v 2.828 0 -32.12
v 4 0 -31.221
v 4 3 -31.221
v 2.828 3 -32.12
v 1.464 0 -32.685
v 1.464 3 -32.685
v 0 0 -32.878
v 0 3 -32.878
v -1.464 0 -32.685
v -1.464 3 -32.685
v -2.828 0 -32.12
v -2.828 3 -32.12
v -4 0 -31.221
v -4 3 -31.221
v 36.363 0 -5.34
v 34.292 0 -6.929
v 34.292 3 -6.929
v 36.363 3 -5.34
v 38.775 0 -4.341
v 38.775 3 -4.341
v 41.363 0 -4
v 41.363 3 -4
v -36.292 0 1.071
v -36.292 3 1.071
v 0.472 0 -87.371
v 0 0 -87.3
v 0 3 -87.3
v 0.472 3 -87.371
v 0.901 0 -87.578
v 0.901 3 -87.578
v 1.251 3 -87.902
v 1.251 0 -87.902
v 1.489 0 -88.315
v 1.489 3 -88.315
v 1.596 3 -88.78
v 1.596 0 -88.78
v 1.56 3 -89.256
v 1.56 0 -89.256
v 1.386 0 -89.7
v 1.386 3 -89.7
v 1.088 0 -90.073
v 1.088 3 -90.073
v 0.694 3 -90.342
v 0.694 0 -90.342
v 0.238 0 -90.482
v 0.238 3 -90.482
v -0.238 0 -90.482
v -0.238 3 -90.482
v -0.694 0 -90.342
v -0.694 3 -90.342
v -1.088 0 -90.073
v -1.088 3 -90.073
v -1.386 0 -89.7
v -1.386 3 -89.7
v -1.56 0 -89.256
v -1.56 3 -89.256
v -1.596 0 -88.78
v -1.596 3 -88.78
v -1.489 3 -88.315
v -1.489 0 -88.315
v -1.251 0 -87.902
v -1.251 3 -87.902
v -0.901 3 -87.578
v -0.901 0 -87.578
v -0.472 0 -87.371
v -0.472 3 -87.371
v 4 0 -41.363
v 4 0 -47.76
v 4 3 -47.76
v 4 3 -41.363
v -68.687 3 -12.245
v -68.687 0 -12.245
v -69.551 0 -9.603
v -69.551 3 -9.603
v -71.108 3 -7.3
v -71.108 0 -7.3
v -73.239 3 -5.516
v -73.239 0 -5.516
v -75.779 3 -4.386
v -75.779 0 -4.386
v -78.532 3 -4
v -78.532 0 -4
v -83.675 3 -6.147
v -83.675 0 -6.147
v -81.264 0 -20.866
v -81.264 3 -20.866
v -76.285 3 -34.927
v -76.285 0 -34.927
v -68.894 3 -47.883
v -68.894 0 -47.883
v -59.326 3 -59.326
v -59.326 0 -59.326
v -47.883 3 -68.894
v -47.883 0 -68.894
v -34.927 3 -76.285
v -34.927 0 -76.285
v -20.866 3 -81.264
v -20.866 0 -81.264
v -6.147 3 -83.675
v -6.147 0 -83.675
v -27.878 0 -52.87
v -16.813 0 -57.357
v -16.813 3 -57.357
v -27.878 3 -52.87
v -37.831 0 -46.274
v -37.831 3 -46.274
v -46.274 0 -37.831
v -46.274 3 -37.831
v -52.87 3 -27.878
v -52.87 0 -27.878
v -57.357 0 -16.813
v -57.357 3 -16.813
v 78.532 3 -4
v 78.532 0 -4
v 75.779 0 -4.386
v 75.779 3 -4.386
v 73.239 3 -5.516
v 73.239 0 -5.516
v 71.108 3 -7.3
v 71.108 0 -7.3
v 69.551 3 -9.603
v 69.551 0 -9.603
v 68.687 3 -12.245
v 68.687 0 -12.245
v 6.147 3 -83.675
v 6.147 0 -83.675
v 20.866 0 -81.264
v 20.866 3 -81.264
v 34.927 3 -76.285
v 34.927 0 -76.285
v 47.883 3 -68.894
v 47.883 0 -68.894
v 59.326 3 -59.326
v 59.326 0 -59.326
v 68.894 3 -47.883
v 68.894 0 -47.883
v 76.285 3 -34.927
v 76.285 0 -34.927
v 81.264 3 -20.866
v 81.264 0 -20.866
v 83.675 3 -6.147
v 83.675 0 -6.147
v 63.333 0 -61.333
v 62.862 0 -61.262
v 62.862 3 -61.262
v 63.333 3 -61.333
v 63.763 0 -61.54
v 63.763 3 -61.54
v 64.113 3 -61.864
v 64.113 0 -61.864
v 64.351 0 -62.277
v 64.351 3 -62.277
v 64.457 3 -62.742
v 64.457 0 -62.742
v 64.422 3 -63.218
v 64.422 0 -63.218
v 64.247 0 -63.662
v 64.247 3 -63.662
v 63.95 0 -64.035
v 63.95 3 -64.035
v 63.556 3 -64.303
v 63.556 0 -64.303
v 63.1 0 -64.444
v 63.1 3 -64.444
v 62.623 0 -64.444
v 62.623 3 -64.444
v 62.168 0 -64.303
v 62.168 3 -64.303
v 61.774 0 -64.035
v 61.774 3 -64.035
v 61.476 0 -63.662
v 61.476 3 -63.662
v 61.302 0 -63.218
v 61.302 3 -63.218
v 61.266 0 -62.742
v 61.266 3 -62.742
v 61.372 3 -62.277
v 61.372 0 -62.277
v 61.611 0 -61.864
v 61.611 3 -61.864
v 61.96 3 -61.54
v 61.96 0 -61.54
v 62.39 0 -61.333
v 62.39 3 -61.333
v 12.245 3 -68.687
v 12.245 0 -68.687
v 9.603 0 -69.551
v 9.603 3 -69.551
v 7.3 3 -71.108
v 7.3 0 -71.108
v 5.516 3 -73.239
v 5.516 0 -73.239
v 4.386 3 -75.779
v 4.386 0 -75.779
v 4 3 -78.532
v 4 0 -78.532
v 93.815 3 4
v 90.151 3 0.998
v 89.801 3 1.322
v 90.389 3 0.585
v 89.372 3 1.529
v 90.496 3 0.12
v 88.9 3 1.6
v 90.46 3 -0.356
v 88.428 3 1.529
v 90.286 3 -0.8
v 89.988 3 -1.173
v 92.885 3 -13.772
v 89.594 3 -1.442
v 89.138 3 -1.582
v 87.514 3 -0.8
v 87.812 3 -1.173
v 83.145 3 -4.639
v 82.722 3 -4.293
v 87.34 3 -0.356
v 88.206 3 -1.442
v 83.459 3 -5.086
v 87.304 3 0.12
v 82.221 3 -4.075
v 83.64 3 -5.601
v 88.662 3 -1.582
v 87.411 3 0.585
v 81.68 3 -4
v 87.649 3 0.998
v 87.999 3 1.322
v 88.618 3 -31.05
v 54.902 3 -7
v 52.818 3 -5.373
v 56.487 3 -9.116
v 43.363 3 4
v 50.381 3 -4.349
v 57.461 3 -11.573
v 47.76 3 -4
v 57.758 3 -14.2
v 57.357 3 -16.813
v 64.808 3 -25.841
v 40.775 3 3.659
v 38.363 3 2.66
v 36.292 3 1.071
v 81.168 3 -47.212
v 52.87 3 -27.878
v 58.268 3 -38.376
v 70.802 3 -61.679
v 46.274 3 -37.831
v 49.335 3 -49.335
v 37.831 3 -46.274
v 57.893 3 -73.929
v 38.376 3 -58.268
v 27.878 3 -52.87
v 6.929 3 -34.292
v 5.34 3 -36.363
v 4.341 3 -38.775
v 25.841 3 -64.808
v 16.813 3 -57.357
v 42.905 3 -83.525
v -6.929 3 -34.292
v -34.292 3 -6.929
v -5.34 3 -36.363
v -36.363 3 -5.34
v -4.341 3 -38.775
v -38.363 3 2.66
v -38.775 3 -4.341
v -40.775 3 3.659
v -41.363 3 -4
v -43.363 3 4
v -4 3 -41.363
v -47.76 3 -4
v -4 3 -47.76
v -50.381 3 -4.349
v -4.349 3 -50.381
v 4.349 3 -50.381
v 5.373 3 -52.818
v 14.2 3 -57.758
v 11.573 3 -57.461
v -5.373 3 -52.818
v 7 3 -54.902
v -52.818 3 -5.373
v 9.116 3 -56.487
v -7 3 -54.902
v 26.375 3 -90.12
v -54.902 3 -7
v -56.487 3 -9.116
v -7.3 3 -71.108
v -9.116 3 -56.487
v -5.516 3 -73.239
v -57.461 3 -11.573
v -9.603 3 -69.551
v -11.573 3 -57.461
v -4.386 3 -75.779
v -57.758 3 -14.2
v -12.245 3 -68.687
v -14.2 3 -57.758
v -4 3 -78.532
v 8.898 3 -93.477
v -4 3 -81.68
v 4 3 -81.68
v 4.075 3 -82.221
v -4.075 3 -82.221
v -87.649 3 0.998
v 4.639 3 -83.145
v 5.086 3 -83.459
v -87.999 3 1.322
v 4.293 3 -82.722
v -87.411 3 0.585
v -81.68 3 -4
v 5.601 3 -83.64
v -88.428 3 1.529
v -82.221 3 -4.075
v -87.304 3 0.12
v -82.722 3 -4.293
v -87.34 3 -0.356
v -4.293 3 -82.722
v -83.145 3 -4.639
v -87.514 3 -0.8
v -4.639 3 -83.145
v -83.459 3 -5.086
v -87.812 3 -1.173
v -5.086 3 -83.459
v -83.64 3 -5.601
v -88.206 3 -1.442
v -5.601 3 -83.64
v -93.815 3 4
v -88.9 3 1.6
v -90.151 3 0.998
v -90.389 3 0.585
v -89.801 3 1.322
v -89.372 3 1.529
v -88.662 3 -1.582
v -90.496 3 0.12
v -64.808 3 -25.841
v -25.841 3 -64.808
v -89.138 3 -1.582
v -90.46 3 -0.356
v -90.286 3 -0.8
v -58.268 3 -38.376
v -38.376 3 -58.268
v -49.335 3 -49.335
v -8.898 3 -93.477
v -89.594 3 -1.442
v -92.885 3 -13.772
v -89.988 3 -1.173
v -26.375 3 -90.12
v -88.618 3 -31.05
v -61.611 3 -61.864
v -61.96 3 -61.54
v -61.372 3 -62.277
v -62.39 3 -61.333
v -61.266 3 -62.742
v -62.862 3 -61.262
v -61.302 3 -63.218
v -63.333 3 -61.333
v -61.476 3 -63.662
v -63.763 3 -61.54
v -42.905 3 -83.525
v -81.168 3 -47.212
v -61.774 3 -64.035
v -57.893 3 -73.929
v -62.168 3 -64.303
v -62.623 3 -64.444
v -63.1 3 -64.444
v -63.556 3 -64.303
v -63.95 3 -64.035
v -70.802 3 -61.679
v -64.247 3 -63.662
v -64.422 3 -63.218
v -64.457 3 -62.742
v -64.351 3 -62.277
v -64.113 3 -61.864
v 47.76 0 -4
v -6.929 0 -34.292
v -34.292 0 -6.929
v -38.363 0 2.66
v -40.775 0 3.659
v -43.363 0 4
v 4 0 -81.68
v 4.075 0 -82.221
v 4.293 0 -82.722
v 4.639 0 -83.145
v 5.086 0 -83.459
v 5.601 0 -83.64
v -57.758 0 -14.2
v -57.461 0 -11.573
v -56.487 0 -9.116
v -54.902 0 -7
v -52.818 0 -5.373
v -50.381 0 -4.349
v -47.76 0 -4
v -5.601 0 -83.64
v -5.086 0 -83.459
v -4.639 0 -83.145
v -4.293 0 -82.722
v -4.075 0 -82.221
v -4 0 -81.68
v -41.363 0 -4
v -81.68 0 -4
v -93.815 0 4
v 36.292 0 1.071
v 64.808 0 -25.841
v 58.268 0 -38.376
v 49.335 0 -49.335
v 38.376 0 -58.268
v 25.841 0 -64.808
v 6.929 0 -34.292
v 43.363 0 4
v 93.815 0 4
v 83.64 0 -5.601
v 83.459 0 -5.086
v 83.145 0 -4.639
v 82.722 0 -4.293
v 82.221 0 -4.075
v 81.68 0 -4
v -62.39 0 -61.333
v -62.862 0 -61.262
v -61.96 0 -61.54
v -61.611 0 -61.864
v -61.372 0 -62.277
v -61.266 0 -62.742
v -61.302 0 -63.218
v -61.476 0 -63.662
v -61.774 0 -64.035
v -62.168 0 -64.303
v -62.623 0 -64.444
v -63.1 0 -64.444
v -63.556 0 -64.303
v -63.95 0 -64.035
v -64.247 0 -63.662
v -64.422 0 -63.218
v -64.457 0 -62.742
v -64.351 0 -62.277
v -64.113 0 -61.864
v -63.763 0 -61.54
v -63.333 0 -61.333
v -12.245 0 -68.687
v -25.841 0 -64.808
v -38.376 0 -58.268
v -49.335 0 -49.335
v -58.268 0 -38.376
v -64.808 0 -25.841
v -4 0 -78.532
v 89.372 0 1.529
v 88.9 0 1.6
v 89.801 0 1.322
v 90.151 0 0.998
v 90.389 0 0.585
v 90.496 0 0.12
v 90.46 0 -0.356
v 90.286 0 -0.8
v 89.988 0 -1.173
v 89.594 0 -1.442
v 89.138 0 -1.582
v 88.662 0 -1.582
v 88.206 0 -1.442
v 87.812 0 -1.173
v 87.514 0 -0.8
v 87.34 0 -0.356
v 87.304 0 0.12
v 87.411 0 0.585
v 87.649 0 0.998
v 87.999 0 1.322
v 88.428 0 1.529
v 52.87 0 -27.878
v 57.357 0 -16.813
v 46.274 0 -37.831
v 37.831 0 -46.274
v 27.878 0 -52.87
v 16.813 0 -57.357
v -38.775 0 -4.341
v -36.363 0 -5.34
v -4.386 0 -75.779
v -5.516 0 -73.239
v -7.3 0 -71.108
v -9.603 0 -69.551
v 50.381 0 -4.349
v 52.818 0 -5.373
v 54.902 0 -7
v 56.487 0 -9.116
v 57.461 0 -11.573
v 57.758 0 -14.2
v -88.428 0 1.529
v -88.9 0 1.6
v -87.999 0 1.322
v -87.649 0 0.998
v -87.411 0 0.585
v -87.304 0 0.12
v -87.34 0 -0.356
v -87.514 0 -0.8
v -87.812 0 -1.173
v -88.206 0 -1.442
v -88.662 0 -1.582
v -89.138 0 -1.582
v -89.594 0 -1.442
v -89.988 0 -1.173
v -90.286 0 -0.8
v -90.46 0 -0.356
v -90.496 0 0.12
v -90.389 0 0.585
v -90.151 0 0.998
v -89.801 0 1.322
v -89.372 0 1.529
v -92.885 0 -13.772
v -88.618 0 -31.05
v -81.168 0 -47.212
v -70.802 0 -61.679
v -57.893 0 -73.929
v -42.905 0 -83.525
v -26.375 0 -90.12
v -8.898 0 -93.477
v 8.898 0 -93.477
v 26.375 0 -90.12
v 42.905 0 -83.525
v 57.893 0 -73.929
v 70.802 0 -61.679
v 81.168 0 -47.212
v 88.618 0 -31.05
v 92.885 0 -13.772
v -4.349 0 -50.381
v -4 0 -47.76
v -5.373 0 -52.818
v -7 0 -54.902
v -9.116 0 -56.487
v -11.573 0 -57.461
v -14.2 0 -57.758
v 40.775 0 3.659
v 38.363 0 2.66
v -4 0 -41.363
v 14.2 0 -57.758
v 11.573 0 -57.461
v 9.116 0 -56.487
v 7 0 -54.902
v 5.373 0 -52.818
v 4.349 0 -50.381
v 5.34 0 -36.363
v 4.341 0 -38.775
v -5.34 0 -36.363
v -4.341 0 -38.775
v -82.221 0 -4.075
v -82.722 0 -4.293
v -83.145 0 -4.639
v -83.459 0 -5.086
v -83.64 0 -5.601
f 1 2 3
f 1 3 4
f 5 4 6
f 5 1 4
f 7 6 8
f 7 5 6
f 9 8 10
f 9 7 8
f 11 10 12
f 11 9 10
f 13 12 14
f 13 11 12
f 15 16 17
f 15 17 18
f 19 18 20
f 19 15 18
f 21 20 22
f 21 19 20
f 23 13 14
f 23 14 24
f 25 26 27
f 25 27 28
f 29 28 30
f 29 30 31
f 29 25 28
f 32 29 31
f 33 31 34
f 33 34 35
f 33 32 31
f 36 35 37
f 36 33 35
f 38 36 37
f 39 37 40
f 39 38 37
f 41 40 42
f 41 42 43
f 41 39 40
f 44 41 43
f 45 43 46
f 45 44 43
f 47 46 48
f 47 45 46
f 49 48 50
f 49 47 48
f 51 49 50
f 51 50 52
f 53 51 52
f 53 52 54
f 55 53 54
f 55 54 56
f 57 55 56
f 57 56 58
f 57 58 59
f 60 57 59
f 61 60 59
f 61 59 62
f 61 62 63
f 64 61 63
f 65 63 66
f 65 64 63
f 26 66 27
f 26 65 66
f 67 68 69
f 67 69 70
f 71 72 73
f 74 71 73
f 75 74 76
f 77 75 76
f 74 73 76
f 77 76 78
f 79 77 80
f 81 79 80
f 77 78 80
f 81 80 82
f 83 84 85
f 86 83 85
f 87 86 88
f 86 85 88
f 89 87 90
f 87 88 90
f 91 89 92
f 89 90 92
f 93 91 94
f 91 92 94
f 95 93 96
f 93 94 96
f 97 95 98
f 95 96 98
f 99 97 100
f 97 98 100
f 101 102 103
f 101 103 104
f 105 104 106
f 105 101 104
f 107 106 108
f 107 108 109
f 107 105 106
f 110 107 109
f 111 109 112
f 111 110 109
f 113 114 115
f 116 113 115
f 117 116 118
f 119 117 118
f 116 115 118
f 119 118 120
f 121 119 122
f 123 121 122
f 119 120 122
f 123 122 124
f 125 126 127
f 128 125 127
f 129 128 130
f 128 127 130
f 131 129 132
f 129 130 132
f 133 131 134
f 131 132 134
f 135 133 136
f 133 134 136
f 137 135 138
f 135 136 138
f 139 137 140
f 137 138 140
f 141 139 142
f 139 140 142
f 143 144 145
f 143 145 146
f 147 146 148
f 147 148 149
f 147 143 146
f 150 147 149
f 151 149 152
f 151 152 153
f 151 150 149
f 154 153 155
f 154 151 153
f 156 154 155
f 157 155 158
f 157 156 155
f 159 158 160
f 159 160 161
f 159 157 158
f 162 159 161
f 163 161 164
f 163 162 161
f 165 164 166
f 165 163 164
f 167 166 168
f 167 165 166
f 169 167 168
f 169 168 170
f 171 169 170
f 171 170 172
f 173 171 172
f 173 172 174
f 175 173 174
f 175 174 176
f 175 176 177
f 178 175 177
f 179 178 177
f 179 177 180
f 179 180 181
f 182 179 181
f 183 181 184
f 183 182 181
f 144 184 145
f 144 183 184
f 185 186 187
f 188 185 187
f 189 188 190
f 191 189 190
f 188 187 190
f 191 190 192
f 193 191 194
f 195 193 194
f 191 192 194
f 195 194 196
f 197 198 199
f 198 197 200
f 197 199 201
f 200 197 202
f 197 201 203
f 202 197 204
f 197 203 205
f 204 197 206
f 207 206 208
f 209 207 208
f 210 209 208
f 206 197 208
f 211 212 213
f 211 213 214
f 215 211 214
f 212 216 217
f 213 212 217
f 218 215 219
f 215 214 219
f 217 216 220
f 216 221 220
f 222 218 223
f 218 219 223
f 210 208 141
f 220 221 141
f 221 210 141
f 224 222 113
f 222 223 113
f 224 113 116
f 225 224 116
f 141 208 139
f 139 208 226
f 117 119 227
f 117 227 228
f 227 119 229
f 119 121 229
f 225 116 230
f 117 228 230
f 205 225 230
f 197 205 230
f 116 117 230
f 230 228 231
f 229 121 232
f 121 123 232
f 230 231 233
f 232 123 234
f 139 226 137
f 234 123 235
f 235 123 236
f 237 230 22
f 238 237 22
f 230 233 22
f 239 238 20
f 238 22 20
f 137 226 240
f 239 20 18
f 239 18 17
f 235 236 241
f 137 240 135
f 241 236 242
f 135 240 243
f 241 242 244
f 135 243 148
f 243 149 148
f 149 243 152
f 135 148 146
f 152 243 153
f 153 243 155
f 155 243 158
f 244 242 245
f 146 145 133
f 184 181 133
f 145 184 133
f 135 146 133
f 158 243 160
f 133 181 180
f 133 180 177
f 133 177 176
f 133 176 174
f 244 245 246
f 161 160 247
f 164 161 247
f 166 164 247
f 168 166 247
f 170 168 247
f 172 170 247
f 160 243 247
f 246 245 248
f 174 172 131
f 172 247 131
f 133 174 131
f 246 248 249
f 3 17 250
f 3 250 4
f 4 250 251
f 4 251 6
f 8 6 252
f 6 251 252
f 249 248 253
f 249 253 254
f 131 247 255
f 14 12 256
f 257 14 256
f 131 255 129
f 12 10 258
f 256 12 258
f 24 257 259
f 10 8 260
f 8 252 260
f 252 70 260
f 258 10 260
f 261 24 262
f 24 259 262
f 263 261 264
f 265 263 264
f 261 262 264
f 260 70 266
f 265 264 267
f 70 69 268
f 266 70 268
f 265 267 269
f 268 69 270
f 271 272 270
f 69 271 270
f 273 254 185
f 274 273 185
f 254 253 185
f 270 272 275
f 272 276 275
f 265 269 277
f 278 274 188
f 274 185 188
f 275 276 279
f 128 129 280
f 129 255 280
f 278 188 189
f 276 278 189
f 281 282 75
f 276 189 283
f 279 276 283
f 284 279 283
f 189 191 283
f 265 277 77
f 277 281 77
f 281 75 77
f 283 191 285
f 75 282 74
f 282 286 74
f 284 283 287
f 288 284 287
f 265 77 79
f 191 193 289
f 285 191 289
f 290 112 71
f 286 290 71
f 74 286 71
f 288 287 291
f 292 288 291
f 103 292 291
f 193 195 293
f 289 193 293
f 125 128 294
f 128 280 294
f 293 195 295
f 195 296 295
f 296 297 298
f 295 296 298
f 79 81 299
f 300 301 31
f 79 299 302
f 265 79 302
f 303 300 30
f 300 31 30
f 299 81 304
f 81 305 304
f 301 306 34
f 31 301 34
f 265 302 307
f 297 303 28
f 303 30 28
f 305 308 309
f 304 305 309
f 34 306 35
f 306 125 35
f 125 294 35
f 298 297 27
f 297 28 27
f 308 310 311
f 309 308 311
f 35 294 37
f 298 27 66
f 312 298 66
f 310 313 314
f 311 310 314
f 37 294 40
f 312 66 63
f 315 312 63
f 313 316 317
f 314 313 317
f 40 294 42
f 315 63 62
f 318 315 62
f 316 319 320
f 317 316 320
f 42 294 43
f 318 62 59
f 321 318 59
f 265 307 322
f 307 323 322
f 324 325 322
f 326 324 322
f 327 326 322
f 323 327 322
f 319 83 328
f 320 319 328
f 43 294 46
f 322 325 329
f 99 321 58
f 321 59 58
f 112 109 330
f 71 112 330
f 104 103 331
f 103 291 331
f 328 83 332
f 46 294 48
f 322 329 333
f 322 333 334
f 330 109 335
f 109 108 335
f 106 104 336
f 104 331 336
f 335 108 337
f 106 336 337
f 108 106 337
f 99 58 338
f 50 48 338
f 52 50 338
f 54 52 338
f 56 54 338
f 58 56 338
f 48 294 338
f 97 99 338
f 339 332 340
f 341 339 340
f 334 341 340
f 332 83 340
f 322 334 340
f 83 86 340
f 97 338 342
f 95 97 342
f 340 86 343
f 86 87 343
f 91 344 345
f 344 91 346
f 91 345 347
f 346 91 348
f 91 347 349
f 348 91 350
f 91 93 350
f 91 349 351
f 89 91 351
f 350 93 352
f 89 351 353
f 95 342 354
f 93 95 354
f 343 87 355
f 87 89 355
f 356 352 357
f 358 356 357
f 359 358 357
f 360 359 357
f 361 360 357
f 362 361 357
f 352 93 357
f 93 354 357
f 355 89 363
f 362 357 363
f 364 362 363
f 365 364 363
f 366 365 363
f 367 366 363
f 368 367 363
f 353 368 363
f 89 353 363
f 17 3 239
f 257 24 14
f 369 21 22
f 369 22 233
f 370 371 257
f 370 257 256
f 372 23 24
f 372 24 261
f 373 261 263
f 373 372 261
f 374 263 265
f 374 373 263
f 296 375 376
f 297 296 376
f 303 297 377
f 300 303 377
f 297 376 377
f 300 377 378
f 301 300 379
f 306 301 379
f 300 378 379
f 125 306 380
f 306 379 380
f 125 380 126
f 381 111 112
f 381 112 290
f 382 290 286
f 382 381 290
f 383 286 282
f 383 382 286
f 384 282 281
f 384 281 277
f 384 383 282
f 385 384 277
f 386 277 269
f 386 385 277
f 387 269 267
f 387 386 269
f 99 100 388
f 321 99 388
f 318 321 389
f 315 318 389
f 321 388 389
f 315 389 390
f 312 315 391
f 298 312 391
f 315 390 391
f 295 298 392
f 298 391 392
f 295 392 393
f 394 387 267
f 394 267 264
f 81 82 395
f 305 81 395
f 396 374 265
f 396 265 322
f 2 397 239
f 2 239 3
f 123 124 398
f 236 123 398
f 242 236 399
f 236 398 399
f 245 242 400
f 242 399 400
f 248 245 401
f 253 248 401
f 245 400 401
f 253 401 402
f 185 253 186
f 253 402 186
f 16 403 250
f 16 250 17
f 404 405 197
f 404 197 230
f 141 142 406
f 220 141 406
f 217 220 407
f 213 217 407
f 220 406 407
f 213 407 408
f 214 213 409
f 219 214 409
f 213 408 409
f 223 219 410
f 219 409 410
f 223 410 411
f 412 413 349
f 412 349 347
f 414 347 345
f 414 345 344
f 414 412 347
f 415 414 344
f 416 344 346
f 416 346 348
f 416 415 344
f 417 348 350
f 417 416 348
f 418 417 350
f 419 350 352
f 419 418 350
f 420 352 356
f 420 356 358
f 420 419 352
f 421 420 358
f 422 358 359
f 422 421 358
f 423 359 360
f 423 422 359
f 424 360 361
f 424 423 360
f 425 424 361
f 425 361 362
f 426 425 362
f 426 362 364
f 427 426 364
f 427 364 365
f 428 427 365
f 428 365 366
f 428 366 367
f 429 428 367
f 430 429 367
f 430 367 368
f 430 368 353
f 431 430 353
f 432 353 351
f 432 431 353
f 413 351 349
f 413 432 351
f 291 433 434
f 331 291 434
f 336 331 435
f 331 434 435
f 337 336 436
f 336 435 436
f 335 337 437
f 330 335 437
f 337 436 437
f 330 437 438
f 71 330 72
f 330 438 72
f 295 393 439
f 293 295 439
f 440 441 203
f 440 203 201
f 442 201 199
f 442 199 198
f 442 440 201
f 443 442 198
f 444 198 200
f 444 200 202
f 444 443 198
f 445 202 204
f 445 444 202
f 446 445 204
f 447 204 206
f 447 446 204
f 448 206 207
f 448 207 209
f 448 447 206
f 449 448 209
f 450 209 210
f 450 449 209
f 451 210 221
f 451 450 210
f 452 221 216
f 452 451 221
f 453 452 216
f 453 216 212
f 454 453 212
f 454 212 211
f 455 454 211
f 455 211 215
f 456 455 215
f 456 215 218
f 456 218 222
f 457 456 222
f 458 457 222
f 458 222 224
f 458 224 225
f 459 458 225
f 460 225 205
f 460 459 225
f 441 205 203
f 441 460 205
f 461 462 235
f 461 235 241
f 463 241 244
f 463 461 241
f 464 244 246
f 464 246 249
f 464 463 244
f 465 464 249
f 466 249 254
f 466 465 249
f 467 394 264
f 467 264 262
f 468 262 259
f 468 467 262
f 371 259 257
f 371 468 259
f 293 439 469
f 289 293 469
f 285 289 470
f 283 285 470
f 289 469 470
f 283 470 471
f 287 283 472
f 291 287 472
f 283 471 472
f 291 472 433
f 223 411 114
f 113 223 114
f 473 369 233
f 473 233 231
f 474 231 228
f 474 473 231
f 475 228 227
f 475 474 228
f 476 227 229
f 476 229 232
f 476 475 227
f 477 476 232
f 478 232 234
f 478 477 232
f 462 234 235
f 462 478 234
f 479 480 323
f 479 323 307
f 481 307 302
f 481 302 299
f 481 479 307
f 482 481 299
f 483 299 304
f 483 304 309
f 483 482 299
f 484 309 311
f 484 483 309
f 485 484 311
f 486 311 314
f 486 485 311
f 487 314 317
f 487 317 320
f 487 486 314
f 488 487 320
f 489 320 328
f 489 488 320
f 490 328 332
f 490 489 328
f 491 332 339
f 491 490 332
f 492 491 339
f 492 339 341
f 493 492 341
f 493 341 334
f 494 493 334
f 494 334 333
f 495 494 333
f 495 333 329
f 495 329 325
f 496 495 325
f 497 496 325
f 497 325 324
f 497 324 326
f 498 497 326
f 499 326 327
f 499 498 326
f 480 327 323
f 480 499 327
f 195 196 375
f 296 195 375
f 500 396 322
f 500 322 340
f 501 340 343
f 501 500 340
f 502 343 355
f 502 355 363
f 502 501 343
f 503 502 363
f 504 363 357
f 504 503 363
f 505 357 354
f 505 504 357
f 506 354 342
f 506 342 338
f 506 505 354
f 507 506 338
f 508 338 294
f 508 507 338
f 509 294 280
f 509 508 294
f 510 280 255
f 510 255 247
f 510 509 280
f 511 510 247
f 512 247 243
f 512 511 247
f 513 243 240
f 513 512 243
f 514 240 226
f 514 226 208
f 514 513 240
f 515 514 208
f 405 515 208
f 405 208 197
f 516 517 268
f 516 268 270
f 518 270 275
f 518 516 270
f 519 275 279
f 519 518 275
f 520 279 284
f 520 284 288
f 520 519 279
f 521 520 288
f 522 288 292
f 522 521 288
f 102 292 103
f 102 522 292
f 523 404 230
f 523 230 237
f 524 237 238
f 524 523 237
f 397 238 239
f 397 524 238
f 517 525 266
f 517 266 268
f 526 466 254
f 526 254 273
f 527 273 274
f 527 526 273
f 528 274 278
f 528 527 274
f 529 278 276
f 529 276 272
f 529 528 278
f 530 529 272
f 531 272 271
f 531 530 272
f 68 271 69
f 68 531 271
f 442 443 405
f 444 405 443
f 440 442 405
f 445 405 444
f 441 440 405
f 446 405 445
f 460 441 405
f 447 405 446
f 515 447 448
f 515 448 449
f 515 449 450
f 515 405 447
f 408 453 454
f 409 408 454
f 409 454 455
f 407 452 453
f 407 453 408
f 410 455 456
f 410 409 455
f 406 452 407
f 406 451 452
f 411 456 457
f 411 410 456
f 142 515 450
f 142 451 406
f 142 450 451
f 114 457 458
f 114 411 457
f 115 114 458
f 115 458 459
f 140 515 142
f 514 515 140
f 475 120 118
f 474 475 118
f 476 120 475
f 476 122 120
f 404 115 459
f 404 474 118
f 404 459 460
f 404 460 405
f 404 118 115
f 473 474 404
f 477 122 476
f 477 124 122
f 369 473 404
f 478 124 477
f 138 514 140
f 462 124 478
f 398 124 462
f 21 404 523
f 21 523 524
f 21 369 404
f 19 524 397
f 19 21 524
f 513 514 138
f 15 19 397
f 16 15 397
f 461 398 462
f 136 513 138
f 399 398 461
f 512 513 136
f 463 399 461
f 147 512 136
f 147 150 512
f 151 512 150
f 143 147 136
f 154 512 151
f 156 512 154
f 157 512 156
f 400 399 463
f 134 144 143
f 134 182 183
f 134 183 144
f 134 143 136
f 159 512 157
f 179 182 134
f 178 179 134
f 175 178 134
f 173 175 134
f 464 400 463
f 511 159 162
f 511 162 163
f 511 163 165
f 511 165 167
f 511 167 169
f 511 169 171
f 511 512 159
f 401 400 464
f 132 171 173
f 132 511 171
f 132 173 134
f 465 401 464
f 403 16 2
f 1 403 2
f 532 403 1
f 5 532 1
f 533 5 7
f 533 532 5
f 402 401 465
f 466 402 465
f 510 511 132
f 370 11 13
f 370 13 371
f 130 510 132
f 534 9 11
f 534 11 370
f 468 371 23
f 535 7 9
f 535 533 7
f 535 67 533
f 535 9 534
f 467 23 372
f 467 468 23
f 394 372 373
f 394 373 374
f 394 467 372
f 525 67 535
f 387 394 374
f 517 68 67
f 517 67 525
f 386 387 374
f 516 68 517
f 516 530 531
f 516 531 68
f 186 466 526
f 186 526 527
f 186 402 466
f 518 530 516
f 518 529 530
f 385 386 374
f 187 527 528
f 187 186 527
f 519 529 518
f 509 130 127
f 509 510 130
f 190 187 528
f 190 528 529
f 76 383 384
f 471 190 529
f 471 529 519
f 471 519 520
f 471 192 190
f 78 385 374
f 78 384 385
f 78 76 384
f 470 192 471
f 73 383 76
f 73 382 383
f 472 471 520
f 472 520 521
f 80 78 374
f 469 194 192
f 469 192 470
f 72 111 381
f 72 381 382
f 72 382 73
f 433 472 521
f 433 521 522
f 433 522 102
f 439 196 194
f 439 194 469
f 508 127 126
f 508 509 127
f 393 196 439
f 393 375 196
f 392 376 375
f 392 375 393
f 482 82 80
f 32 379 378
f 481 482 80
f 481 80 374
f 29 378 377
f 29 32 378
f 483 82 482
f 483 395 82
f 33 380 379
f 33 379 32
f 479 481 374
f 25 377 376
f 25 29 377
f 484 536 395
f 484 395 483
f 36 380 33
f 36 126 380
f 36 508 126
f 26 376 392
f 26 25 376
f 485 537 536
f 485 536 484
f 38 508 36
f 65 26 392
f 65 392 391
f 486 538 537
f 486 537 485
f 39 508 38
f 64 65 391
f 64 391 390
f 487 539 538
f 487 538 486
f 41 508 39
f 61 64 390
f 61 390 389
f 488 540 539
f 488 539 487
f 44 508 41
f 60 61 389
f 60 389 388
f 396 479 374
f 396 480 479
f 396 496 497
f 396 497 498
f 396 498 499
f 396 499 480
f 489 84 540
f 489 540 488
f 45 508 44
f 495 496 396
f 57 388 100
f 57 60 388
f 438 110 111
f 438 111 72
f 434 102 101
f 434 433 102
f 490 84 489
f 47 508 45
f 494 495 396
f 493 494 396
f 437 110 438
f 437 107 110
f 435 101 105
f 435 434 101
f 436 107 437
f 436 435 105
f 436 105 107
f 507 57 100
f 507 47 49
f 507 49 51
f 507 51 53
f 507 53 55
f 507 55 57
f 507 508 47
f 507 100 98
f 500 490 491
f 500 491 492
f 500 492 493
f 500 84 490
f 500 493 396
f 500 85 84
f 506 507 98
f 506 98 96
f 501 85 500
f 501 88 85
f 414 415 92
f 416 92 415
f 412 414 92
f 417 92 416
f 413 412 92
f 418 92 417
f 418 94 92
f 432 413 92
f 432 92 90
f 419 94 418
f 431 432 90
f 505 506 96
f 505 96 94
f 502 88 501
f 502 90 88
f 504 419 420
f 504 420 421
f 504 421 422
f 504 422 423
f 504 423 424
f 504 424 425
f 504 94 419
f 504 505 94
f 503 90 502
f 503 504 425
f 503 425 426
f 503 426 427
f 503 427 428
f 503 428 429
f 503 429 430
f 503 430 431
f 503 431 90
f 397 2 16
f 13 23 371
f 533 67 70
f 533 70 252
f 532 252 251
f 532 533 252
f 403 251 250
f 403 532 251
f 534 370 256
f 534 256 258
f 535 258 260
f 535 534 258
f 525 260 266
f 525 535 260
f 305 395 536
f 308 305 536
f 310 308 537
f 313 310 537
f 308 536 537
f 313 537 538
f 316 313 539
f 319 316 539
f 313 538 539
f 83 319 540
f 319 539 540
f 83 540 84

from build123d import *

# Parameters (mm, degrees)
SKETCH_1_R      = 1.6
EXTRUDE_1_DEPTH = 3


with BuildPart() as part:
    # 草图1 → 凸台-拉伸1 (new body)
    with BuildSketch(Plane(origin=(0, 0, 0), x_dir=(1, 0, 0), z_dir=(0, 1, 0))):
        with BuildLine():
            Line((-31.220966692, 4), (-36.292034504, -1.071067812))
            ThreePointArc((-36.292034504, -1.071067812), (-39.536267992, -3.238795325), (-43.363102316, -4))
            Line((-43.363102316, -4), (-46.95, -4))
            Line((-46.95, -4), (-83.804594146, -4))
            Line((-83.804594146, -4), (-93.814764296, -4))
            ThreePointArc((-93.814764296, -4), (0, 93.9), (93.814764296, -4))
            Line((93.814764296, -4), (83.804594146, -4))
            Line((83.804594146, -4), (46.95, -4))
            Line((46.95, -4), (43.363102316, -4))
            ThreePointArc((43.363102316, -4), (39.536267992, -3.238795325), (36.292034504, -1.071067812))
            Line((36.292034504, -1.071067812), (31.220966692, 4))
            Line((31.220966692, 4), (4, 31.220966692))
            ThreePointArc((4, 31.220966692), (0, 32.877820942), (-4, 31.220966692))
            Line((-4, 31.220966692), (-31.220966692, 4))
        make_face()
        with Locations(Location((88.9, 0, 0), (0, 0, 270))):
            Circle(SKETCH_1_R, mode=Mode.SUBTRACT)
        with Locations(Location((-88.9, 0, 0), (0, 0, 270))):
            Circle(SKETCH_1_R, mode=Mode.SUBTRACT)
        with Locations(Location((-62.861792847, 62.861792847, 0), (0, 0, 270))):
            Circle(SKETCH_1_R, mode=Mode.SUBTRACT)
        with Locations(Location((0, 88.9, 0), (0, 0, 270))):
            Circle(SKETCH_1_R, mode=Mode.SUBTRACT)
        with Locations(Location((62.861792847, 62.861792847, 0), (0, 0, 270))):
            Circle(SKETCH_1_R, mode=Mode.SUBTRACT)
        with BuildLine():
            Line((46.95, 4), (47.760369555, 4))
            ThreePointArc((47.760369555, 4), (55.764412134, 8.005393892), (57.356586062, 16.812939522))
            ThreePointArc((57.356586062, 16.812939522), (42.263772312, 42.263772312), (16.812939522, 57.356586062))
            ThreePointArc((16.812939522, 57.356586062), (8.005393892, 55.764412134), (4, 47.760369555))
            Line((4, 47.760369555), (4, 46.95))
            Line((4, 46.95), (4, 41.363102316))
            ThreePointArc((4, 41.363102316), (4.761204675, 37.536267992), (6.928932188, 34.292034504))
            Line((6.928932188, 34.292034504), (34.292034504, 6.928932188))
            ThreePointArc((34.292034504, 6.928932188), (37.536267992, 4.761204675), (41.363102316, 4))
            Line((41.363102316, 4), (46.95, 4))
        make_face(mode=Mode.SUBTRACT)
        with BuildLine():
            Line((-46.95, 4), (-41.363102316, 4))
            ThreePointArc((-41.363102316, 4), (-37.536267992, 4.761204675), (-34.292034504, 6.928932188))
            Line((-34.292034504, 6.928932188), (-6.928932188, 34.292034504))
            ThreePointArc((-6.928932188, 34.292034504), (-4.761204675, 37.536267992), (-4, 41.363102316))
            Line((-4, 41.363102316), (-4, 46.95))
            Line((-4, 46.95), (-4, 47.760369555))
            ThreePointArc((-4, 47.760369555), (-8.005393892, 55.764412134), (-16.812939522, 57.356586062))
            ThreePointArc((-16.812939522, 57.356586062), (-42.263772312, 42.263772312), (-57.356586062, 16.812939522))
            ThreePointArc((-57.356586062, 16.812939522), (-55.764412134, 8.005393892), (-47.760369555, 4))
            Line((-47.760369555, 4), (-46.95, 4))
        make_face(mode=Mode.SUBTRACT)
        with BuildLine():
            Line((-78.53185914, 4), (-81.679924094, 4))
            ThreePointArc((-81.679924094, 4), (-83.145024823, 4.638574331), (-83.674549835, 6.146520147))
            ThreePointArc((-83.674549835, 6.146520147), (-59.326258942, 59.326258942), (-6.146520147, 83.674549835))
            ThreePointArc((-6.146520147, 83.674549835), (-4.638574331, 83.145024823), (-4, 81.679924094))
            Line((-4, 81.679924094), (-4, 78.53185914))
            ThreePointArc((-4, 78.53185914), (-6.333499574, 72.111207209), (-12.244954243, 68.687072987))
            ThreePointArc((-12.244954243, 68.687072987), (-49.334840123, 49.334840123), (-68.687072987, 12.244954243))
            ThreePointArc((-68.687072987, 12.244954243), (-72.111207209, 6.333499574), (-78.53185914, 4))
        make_face(mode=Mode.SUBTRACT)
        with BuildLine():
            Line((4, 78.53185914), (4, 81.679924094))
            ThreePointArc((4, 81.679924094), (4.638574331, 83.145024823), (6.146520147, 83.674549835))
            ThreePointArc((6.146520147, 83.674549835), (59.326258942, 59.326258942), (83.674549835, 6.146520147))
            ThreePointArc((83.674549835, 6.146520147), (83.145024823, 4.638574331), (81.679924094, 4))
            Line((81.679924094, 4), (78.53185914, 4))
            ThreePointArc((78.53185914, 4), (72.111207209, 6.333499574), (68.687072987, 12.244954243))
            ThreePointArc((68.687072987, 12.244954243), (49.334840123, 49.334840123), (12.244954243, 68.687072987))
            ThreePointArc((12.244954243, 68.687072987), (6.333499574, 72.111207209), (4, 78.53185914))
        make_face(mode=Mode.SUBTRACT)
    extrude(amount=EXTRUDE_1_DEPTH)


solid = part.part
